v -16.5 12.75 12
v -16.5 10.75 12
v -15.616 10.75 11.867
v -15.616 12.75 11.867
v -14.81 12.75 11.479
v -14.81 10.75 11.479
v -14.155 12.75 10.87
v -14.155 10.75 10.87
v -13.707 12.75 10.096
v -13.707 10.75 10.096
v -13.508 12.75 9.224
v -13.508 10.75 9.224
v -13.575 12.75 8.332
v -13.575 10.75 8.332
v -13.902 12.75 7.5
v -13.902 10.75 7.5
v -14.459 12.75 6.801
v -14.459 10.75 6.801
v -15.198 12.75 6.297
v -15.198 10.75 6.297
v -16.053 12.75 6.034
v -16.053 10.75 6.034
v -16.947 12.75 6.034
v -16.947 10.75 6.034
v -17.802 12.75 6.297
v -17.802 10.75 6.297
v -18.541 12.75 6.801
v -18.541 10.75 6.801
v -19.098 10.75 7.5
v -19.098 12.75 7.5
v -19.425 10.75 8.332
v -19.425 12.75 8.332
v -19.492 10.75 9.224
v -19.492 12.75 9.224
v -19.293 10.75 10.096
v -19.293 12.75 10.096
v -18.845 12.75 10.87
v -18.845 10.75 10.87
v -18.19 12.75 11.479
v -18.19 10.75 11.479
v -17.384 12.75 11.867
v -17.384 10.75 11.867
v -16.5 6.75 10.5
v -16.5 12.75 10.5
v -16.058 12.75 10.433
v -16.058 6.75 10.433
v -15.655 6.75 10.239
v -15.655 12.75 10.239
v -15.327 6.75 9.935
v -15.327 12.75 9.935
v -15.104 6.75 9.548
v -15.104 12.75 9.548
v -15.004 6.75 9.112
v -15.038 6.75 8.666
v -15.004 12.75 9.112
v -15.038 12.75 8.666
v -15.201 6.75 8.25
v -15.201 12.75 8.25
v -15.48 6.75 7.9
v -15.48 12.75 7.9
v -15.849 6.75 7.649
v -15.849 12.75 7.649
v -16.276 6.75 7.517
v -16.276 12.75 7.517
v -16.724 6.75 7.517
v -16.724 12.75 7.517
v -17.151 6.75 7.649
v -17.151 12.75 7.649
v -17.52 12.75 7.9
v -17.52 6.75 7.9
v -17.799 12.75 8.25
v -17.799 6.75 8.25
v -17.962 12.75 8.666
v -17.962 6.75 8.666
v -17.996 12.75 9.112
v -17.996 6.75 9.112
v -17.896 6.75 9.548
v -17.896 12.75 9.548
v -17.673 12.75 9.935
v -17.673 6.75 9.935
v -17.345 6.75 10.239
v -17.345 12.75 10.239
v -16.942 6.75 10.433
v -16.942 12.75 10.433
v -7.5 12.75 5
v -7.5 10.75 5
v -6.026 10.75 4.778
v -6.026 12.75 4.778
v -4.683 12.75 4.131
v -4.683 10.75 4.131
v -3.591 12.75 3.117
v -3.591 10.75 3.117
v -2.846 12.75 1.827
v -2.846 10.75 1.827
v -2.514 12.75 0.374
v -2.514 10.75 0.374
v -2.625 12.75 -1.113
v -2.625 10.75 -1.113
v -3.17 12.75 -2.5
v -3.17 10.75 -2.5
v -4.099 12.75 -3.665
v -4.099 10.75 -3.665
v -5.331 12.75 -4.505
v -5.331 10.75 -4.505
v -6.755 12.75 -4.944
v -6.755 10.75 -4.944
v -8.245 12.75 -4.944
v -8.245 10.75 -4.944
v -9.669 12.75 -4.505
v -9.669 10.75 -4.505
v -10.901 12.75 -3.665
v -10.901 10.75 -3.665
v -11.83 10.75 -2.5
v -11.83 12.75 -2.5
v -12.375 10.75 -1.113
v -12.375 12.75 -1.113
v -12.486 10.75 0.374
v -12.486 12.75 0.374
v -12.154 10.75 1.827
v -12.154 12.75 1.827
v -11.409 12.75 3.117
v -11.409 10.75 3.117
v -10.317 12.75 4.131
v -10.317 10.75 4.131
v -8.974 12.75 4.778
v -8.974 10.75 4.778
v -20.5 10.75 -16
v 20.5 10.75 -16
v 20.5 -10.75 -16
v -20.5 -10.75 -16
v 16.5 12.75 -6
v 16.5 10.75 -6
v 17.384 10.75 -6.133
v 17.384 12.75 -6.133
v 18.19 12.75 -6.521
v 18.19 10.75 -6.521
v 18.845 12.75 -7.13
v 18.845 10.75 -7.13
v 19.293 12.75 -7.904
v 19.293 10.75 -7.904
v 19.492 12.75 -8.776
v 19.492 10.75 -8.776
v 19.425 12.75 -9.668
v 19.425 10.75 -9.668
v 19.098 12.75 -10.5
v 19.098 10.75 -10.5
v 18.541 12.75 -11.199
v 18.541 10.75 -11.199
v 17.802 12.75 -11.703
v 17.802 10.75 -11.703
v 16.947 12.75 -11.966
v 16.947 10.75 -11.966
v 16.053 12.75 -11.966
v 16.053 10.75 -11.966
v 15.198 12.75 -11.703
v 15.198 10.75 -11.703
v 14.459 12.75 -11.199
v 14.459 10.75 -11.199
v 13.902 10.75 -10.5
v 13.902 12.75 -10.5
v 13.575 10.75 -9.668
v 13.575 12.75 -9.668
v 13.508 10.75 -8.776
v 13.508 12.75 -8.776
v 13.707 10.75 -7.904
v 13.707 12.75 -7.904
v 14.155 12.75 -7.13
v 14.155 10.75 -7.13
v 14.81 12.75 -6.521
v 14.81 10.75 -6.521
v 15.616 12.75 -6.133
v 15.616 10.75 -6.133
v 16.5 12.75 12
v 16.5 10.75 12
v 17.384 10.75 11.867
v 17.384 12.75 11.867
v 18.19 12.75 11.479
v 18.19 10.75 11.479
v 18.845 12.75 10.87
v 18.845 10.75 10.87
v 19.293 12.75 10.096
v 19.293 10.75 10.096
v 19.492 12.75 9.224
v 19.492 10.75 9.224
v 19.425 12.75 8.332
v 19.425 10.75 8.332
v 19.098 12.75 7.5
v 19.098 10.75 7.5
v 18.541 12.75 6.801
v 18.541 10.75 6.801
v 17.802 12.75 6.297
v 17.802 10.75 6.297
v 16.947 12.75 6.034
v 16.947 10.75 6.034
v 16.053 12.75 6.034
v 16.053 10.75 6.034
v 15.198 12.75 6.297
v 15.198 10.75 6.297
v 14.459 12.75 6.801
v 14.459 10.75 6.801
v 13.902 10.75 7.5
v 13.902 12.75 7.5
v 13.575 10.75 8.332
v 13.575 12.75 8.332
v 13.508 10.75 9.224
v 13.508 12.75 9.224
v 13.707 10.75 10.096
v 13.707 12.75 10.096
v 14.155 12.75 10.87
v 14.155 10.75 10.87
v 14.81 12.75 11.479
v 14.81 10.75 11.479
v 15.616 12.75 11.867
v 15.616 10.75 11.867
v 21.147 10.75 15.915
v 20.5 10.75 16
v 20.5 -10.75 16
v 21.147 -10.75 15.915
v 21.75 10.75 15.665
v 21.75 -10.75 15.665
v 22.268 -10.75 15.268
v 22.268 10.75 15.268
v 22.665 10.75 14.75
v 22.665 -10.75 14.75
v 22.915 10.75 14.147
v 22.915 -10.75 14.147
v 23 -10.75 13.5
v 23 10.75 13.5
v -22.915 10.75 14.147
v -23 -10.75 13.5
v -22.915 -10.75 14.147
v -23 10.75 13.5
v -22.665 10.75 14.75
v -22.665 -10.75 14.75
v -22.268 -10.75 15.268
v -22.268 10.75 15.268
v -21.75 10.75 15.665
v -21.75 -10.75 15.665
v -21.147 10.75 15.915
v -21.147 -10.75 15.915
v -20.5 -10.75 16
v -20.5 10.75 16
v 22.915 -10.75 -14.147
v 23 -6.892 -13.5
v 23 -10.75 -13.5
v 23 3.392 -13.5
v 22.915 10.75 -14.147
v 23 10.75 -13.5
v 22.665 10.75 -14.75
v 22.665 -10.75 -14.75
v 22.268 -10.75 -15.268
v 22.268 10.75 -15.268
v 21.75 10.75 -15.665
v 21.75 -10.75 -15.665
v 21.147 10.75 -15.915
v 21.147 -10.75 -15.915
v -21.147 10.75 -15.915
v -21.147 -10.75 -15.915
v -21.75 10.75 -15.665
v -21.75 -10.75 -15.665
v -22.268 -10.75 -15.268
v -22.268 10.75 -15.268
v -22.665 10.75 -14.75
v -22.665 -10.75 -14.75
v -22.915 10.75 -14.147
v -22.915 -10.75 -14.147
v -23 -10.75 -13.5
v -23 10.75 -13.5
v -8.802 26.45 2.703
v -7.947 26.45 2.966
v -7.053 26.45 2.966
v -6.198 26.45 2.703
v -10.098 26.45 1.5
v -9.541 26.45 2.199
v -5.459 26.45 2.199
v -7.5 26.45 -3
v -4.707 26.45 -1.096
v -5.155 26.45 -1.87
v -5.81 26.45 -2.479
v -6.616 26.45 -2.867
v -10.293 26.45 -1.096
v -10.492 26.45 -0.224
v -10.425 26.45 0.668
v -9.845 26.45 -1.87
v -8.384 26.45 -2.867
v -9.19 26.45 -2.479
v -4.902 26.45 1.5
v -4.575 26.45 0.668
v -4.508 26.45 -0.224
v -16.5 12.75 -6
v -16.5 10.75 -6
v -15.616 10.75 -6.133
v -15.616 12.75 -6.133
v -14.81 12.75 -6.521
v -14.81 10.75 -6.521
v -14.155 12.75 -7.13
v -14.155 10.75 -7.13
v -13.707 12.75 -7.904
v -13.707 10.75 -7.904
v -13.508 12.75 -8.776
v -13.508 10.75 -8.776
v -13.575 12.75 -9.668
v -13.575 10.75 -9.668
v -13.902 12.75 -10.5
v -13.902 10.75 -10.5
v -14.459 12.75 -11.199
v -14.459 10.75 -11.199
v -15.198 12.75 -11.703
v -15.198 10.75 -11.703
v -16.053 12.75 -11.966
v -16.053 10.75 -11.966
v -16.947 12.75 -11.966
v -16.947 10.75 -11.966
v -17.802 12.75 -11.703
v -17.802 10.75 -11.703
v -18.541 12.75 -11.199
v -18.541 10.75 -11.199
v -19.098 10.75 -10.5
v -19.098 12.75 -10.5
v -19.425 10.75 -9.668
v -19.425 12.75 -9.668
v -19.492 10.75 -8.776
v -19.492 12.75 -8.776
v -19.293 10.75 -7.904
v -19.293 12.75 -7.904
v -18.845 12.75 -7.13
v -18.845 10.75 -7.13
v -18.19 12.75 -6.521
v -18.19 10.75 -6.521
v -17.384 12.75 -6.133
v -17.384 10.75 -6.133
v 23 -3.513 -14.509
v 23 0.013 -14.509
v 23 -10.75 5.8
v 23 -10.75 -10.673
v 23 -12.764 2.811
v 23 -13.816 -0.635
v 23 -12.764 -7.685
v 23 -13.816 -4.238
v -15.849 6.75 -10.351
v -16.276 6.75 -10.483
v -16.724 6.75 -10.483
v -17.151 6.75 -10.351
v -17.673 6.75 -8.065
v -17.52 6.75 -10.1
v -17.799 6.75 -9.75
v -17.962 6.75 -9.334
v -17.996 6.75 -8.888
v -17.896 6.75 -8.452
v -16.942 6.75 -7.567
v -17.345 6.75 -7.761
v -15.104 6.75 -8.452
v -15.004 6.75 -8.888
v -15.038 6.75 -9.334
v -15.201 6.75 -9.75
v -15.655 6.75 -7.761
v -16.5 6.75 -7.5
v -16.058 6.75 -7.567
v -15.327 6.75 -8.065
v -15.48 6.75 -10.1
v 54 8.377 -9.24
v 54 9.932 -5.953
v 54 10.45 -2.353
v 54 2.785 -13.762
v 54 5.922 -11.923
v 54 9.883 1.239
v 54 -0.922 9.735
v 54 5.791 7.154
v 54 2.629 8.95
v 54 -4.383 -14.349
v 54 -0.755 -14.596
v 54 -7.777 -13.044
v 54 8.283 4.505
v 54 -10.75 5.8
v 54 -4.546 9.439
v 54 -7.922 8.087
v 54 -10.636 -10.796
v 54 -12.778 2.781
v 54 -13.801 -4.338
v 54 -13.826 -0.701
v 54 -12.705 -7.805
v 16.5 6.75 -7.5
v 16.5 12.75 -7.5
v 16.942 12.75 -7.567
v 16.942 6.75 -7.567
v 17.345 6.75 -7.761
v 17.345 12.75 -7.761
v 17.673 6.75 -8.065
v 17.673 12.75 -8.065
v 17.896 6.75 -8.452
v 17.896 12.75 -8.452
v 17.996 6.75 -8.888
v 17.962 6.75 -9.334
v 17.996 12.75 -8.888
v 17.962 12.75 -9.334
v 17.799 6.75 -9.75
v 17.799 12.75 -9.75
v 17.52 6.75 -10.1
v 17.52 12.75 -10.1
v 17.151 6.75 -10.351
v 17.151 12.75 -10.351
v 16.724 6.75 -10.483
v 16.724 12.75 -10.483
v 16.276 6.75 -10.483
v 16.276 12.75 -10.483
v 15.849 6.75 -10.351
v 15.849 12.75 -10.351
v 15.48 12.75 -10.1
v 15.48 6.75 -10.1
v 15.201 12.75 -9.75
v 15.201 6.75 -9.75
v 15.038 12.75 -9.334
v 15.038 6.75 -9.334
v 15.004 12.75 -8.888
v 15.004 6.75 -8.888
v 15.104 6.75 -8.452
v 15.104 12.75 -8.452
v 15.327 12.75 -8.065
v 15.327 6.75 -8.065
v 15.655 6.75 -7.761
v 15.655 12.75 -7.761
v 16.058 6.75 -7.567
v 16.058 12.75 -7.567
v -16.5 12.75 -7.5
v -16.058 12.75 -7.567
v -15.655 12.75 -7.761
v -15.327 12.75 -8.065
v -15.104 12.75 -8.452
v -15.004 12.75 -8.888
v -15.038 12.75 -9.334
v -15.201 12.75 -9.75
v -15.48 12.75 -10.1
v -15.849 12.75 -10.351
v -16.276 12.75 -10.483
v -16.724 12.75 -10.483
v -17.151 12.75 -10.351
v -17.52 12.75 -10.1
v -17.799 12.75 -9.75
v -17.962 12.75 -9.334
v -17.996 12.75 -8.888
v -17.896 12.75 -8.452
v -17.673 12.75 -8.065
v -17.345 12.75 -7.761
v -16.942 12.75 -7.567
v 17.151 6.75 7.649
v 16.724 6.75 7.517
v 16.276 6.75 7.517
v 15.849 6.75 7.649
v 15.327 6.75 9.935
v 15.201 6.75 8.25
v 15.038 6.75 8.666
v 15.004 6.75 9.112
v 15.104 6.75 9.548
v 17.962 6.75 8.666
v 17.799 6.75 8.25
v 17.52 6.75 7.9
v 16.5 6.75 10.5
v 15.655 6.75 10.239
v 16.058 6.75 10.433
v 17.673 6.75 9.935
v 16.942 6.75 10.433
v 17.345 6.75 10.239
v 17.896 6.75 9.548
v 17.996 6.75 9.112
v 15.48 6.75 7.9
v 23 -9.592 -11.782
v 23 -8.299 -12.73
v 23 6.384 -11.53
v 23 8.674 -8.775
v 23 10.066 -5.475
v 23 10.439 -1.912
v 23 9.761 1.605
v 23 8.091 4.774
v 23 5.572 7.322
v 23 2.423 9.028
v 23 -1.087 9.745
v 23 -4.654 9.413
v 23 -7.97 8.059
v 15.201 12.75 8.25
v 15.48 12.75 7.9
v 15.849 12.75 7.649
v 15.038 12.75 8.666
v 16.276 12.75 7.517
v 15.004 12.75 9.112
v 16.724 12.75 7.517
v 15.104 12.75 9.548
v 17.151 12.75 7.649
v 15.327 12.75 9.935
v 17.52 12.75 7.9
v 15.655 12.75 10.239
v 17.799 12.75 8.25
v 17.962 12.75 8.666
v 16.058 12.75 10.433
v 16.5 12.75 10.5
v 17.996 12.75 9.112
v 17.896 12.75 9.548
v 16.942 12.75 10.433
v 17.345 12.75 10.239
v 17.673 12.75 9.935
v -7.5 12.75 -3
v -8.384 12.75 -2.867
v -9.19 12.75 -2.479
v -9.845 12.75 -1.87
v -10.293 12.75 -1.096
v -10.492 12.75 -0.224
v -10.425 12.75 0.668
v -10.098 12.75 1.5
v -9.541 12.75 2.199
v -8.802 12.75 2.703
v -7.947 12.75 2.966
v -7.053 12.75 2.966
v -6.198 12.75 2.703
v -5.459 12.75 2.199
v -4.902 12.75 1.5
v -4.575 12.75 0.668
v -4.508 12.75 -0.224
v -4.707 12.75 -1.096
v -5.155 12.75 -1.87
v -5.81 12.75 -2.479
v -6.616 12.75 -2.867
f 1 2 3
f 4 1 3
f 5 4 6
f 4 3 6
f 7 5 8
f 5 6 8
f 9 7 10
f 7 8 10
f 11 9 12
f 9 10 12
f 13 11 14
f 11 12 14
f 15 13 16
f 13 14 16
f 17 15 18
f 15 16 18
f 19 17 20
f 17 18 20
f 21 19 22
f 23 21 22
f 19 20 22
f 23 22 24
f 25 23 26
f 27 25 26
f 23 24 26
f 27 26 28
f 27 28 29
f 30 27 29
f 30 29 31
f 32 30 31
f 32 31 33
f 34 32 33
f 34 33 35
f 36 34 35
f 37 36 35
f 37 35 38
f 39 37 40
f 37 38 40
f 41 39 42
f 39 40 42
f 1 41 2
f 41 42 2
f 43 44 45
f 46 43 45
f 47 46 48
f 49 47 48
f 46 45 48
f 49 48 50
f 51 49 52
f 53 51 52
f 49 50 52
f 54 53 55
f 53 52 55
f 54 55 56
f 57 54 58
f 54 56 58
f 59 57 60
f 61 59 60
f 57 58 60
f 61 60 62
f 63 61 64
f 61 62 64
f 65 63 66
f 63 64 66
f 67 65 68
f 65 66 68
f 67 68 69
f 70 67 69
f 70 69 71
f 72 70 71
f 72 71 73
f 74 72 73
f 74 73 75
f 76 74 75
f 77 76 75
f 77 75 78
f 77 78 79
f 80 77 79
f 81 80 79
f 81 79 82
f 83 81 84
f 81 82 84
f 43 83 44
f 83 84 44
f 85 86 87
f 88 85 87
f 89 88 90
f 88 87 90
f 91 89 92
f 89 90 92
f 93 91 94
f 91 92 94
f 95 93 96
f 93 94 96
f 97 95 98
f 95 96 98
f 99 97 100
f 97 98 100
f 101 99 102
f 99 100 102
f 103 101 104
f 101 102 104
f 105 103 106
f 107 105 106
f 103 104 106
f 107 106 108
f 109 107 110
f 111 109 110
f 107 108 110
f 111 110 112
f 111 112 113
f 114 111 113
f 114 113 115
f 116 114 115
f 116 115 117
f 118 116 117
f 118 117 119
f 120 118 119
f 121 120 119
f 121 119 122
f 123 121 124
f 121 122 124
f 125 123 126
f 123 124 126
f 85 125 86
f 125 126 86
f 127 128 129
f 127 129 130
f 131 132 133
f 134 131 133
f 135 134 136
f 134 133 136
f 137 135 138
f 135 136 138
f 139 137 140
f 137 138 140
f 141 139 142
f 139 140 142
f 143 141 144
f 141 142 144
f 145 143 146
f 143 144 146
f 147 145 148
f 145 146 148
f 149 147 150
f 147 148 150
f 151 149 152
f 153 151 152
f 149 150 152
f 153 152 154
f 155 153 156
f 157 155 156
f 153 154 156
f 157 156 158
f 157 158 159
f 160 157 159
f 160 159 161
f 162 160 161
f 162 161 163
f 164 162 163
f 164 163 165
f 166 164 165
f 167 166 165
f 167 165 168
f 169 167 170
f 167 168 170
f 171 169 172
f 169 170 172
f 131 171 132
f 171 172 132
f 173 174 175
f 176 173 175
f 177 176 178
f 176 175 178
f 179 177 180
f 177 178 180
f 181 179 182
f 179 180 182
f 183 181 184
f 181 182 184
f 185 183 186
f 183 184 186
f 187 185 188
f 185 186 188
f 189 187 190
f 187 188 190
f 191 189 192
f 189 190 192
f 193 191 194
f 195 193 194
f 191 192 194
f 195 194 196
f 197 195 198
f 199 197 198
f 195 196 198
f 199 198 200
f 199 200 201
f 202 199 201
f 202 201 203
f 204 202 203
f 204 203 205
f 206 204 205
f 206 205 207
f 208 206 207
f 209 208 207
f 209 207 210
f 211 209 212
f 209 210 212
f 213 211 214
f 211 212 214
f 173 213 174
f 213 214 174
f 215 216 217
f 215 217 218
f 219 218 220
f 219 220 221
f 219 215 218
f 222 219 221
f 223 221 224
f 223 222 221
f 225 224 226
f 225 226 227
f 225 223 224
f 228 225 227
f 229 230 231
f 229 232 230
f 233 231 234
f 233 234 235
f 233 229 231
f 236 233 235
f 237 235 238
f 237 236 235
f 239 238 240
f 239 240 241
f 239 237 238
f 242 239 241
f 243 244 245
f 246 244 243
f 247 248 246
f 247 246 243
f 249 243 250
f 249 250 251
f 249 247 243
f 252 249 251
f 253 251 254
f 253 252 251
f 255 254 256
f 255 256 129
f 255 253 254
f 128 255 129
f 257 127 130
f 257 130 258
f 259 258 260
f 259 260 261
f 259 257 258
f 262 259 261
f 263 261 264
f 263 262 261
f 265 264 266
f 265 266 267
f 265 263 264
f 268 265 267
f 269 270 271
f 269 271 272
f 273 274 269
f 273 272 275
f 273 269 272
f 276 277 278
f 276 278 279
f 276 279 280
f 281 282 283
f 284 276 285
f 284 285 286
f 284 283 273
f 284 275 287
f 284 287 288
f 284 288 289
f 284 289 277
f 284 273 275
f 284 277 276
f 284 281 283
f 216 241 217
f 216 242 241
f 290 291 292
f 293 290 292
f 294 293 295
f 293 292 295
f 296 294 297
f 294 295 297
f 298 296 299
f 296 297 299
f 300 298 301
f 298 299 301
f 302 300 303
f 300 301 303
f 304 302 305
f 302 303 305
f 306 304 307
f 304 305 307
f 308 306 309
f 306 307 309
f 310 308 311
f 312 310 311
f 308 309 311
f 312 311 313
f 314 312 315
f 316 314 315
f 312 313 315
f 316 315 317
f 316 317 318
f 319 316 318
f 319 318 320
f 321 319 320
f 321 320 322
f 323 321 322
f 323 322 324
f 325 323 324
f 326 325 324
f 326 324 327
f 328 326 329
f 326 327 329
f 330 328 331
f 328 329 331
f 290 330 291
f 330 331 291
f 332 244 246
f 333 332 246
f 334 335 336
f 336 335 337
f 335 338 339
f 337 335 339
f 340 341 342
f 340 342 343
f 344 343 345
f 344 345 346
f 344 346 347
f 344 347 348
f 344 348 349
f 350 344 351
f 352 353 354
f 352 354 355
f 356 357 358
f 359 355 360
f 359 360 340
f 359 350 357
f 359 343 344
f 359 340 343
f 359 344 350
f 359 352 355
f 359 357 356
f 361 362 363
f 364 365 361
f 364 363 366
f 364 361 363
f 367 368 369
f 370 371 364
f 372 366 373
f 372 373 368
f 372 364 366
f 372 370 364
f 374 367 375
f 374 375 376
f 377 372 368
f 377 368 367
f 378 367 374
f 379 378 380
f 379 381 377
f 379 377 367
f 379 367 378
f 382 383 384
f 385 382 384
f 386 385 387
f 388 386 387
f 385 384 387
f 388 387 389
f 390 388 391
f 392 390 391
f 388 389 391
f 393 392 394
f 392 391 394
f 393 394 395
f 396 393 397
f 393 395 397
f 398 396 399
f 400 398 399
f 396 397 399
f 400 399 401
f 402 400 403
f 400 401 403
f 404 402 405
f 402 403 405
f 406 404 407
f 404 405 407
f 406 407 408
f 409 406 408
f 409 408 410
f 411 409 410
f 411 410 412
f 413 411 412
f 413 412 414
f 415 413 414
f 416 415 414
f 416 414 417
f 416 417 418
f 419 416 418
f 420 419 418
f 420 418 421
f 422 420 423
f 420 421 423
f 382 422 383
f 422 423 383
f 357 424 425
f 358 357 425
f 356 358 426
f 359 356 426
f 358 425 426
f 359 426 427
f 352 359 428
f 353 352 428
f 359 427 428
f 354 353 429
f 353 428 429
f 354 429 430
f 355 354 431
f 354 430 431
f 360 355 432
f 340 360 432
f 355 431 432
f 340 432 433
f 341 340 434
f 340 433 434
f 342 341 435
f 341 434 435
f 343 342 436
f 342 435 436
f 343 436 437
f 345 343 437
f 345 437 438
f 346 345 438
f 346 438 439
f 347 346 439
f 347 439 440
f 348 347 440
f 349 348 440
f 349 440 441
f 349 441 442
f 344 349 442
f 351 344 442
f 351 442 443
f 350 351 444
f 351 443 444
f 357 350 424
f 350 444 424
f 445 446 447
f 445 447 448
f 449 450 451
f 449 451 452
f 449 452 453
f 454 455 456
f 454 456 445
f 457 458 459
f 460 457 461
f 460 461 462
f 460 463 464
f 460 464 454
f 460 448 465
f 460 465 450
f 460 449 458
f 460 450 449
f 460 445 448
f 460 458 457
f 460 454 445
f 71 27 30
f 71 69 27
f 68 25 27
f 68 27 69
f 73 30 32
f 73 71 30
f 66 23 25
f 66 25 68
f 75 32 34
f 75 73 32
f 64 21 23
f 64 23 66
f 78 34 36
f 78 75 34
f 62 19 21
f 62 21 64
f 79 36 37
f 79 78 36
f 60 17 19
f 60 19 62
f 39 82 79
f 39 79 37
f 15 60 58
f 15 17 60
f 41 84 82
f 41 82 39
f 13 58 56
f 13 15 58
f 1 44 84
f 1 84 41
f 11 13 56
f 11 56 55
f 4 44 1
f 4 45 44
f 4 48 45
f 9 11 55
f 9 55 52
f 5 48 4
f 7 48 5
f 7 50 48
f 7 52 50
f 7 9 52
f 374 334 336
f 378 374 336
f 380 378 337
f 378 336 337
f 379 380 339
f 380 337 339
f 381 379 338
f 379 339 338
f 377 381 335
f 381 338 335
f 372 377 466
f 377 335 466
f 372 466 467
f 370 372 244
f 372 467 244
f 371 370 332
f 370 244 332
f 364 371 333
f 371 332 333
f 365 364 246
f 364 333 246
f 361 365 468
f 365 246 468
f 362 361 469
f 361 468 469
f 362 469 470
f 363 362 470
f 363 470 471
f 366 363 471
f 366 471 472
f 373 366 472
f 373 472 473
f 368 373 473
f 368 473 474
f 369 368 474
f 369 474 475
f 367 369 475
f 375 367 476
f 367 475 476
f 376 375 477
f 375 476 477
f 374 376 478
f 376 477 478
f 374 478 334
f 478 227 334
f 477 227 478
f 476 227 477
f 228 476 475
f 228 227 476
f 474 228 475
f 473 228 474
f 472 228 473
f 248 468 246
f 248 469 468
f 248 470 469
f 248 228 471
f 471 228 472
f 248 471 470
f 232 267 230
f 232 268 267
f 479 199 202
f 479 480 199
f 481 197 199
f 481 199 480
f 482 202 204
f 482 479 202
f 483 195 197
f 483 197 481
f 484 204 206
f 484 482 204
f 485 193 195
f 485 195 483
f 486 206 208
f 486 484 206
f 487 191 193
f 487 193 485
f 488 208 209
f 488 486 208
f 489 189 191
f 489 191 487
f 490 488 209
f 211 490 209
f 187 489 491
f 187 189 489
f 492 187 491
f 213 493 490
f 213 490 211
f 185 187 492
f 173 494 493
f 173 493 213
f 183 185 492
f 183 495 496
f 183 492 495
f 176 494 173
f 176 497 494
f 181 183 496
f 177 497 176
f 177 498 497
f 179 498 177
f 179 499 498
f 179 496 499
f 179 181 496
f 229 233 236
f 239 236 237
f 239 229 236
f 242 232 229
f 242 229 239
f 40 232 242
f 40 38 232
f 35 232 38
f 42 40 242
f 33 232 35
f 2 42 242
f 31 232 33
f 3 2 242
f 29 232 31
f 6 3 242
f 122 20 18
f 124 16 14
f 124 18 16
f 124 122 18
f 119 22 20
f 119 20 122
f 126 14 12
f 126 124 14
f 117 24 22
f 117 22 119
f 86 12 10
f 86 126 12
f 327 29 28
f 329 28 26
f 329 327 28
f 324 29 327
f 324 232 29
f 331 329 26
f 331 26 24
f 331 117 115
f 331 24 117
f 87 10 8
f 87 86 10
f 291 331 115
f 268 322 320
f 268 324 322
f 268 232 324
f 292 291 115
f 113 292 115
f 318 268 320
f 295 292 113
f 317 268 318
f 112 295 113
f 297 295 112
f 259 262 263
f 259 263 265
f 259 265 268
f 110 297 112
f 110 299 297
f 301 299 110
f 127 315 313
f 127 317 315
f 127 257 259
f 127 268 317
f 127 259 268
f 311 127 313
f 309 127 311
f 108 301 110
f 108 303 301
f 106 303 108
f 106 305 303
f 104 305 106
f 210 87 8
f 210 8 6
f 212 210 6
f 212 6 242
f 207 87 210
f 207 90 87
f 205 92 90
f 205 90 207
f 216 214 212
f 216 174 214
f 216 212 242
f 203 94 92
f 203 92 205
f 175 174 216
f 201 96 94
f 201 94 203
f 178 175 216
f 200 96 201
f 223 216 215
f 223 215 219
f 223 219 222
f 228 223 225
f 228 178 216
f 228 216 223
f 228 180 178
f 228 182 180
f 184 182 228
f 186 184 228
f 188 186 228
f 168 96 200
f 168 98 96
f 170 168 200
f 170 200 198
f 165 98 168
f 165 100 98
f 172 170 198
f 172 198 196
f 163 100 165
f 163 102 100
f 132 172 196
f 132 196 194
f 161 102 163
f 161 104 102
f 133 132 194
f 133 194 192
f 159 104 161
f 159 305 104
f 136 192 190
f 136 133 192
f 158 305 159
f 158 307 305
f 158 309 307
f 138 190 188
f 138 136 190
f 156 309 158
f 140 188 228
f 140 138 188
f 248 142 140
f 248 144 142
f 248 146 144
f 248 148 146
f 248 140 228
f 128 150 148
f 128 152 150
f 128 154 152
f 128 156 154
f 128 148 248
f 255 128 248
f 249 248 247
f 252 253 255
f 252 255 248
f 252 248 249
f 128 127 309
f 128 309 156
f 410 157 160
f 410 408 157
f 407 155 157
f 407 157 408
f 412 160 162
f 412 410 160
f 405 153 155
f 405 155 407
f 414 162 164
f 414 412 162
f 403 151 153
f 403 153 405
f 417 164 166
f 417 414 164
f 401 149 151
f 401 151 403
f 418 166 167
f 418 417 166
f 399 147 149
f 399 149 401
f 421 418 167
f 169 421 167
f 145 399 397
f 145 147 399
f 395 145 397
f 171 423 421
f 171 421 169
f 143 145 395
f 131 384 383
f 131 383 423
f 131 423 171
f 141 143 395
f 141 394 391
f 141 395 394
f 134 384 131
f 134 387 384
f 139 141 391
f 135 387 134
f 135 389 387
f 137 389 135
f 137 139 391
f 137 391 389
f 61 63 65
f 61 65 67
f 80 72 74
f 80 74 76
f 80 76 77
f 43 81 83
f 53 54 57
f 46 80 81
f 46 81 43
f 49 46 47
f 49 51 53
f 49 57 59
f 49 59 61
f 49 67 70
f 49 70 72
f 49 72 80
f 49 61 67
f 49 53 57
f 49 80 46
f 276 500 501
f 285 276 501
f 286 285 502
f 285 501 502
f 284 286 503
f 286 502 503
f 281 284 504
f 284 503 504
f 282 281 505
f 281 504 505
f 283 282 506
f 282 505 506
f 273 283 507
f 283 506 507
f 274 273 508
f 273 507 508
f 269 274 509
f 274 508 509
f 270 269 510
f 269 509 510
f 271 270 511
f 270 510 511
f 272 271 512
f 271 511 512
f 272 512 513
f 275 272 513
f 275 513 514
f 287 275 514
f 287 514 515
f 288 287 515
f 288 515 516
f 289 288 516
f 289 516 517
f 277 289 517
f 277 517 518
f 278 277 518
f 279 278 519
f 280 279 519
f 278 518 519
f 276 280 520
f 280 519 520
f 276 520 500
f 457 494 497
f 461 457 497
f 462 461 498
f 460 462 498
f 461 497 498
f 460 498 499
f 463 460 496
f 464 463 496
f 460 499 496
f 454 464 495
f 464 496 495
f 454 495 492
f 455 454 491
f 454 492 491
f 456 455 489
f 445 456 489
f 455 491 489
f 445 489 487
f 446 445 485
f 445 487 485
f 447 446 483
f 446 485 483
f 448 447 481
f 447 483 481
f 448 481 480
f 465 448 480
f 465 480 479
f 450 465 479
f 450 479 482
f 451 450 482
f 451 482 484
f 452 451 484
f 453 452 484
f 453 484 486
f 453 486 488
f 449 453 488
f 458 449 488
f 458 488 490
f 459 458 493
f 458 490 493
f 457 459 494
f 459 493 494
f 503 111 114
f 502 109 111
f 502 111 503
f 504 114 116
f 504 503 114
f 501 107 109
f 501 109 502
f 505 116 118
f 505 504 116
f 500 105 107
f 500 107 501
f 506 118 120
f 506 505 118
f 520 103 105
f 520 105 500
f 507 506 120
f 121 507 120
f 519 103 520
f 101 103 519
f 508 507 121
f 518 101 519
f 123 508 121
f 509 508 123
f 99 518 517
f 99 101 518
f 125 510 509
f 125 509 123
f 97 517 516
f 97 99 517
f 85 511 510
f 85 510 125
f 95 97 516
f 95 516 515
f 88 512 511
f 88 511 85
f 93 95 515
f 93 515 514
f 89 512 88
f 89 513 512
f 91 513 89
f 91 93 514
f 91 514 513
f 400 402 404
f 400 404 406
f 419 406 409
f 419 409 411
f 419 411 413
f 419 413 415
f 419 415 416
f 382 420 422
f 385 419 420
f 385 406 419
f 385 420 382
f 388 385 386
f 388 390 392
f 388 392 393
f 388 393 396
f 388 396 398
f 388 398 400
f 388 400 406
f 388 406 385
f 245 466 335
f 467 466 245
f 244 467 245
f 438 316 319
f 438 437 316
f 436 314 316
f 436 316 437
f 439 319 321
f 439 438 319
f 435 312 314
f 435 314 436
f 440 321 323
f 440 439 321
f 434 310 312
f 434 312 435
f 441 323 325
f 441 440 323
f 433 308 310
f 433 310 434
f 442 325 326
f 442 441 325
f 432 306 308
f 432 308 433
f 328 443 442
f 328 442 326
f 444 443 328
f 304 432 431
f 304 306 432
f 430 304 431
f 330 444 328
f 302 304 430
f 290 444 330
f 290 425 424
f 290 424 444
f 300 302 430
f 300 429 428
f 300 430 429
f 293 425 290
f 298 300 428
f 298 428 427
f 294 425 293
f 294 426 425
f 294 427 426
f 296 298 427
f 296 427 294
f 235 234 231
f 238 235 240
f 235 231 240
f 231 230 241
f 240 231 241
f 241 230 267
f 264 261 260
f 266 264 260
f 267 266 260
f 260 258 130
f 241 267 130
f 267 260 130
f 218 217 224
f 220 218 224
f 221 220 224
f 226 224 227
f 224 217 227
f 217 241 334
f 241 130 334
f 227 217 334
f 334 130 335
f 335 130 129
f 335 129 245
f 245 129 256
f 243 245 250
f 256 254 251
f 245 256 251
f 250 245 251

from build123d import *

# Parameters (mm, degrees)
BOSS_EXTRUDE1_DEPTH = 10.75
SKETCH2_R           = 3
SKETCH2_R_2         = 5
BOSS_EXTRUDE2_DEPTH = 2
SKETCH3_R           = 1.5
CUT_EXTRUDE1_DEPTH  = 6
SKETCH4_R           = 3
BOSS_EXTRUDE3_DEPTH = 13.7
SKETCH5_R           = 12.2
BOSS_EXTRUDE4_DEPTH = 31


with BuildPart() as part:
    # Sketch1 → Boss-Extrude1 (new, symmetric)
    with BuildSketch(Plane(origin=(0, 0, 0), x_dir=(1, 0, 0), z_dir=(0, 1, 0))):
        with BuildLine():
            Line((-20.5, -16), (20.5, -16))
            ThreePointArc((20.5, -16), (22.267766953, -15.267766953), (23, -13.5))
            Line((23, -13.5), (23, 13.5))
            ThreePointArc((23, 13.5), (22.267766953, 15.267766953), (20.5, 16))
            Line((20.5, 16), (-20.5, 16))
            ThreePointArc((-20.5, 16), (-22.267766953, 15.267766953), (-23, 13.5))
            Line((-23, 13.5), (-23, -13.5))
            ThreePointArc((-23, -13.5), (-22.267766953, -15.267766953), (-20.5, -16))
        make_face()
    extrude(amount=BOSS_EXTRUDE1_DEPTH, both=True)

    # Sketch2 → Boss-Extrude2 (add)
    with BuildSketch(Plane(origin=(0, 10.75, 0), x_dir=(1, 0, 0), z_dir=(0, 1, 0))):
        with Locations(Location((-16.5, 9, 0), (0, 0, 270))):
            Circle(SKETCH2_R)
        with Locations(Location((-16.5, -9, 0), (0, 0, 270))):
            Circle(SKETCH2_R)
        with Locations(Location((16.5, -9, 0), (0, 0, 270))):
            Circle(SKETCH2_R)
        with Locations(Location((16.5, 9, 0), (0, 0, 270))):
            Circle(SKETCH2_R)
        with Locations(Location((-7.5, 0, 0), (0, 0, 270))):
            Circle(SKETCH2_R_2)
    extrude(amount=BOSS_EXTRUDE2_DEPTH)

    # Sketch3 → Cut-Extrude1 (cut)
    with BuildSketch(Plane(origin=(0, 12.75, 0), x_dir=(1, 0, 0), z_dir=(0, 1, 0))):
        with Locations(Location((-16.5, 9, 0), (0, 0, 270))):
            Circle(SKETCH3_R)
        with Locations(Location((16.5, 9, 0), (0, 0, 270))):
            Circle(SKETCH3_R)
        with Locations(Location((16.5, -9, 0), (0, 0, 270))):
            Circle(SKETCH3_R)
        with Locations(Location((-16.5, -9, 0), (0, 0, 270))):
            Circle(SKETCH3_R)
    extrude(amount=-CUT_EXTRUDE1_DEPTH, mode=Mode.SUBTRACT)

    # Sketch4 → Boss-Extrude3 (add)
    with BuildSketch(Plane(origin=(0, 12.75, 0), x_dir=(1, 0, 0), z_dir=(0, 1, 0))):
        with Locations(Location((-7.5, 0, 0), (0, 0, 90))):
            Circle(SKETCH4_R)
    extrude(amount=BOSS_EXTRUDE3_DEPTH)

    # Sketch5 → Boss-Extrude4 (add)
    with BuildSketch(Plane(origin=(23, 0, 0), x_dir=(0, 0, -1), z_dir=(1, 0, 0))):
        with Locations(Location((2.436698586, -1.75, 0), (0, 0, 227.536275048))):
            Circle(SKETCH5_R)
    extrude(amount=BOSS_EXTRUDE4_DEPTH)


solid = part.part
